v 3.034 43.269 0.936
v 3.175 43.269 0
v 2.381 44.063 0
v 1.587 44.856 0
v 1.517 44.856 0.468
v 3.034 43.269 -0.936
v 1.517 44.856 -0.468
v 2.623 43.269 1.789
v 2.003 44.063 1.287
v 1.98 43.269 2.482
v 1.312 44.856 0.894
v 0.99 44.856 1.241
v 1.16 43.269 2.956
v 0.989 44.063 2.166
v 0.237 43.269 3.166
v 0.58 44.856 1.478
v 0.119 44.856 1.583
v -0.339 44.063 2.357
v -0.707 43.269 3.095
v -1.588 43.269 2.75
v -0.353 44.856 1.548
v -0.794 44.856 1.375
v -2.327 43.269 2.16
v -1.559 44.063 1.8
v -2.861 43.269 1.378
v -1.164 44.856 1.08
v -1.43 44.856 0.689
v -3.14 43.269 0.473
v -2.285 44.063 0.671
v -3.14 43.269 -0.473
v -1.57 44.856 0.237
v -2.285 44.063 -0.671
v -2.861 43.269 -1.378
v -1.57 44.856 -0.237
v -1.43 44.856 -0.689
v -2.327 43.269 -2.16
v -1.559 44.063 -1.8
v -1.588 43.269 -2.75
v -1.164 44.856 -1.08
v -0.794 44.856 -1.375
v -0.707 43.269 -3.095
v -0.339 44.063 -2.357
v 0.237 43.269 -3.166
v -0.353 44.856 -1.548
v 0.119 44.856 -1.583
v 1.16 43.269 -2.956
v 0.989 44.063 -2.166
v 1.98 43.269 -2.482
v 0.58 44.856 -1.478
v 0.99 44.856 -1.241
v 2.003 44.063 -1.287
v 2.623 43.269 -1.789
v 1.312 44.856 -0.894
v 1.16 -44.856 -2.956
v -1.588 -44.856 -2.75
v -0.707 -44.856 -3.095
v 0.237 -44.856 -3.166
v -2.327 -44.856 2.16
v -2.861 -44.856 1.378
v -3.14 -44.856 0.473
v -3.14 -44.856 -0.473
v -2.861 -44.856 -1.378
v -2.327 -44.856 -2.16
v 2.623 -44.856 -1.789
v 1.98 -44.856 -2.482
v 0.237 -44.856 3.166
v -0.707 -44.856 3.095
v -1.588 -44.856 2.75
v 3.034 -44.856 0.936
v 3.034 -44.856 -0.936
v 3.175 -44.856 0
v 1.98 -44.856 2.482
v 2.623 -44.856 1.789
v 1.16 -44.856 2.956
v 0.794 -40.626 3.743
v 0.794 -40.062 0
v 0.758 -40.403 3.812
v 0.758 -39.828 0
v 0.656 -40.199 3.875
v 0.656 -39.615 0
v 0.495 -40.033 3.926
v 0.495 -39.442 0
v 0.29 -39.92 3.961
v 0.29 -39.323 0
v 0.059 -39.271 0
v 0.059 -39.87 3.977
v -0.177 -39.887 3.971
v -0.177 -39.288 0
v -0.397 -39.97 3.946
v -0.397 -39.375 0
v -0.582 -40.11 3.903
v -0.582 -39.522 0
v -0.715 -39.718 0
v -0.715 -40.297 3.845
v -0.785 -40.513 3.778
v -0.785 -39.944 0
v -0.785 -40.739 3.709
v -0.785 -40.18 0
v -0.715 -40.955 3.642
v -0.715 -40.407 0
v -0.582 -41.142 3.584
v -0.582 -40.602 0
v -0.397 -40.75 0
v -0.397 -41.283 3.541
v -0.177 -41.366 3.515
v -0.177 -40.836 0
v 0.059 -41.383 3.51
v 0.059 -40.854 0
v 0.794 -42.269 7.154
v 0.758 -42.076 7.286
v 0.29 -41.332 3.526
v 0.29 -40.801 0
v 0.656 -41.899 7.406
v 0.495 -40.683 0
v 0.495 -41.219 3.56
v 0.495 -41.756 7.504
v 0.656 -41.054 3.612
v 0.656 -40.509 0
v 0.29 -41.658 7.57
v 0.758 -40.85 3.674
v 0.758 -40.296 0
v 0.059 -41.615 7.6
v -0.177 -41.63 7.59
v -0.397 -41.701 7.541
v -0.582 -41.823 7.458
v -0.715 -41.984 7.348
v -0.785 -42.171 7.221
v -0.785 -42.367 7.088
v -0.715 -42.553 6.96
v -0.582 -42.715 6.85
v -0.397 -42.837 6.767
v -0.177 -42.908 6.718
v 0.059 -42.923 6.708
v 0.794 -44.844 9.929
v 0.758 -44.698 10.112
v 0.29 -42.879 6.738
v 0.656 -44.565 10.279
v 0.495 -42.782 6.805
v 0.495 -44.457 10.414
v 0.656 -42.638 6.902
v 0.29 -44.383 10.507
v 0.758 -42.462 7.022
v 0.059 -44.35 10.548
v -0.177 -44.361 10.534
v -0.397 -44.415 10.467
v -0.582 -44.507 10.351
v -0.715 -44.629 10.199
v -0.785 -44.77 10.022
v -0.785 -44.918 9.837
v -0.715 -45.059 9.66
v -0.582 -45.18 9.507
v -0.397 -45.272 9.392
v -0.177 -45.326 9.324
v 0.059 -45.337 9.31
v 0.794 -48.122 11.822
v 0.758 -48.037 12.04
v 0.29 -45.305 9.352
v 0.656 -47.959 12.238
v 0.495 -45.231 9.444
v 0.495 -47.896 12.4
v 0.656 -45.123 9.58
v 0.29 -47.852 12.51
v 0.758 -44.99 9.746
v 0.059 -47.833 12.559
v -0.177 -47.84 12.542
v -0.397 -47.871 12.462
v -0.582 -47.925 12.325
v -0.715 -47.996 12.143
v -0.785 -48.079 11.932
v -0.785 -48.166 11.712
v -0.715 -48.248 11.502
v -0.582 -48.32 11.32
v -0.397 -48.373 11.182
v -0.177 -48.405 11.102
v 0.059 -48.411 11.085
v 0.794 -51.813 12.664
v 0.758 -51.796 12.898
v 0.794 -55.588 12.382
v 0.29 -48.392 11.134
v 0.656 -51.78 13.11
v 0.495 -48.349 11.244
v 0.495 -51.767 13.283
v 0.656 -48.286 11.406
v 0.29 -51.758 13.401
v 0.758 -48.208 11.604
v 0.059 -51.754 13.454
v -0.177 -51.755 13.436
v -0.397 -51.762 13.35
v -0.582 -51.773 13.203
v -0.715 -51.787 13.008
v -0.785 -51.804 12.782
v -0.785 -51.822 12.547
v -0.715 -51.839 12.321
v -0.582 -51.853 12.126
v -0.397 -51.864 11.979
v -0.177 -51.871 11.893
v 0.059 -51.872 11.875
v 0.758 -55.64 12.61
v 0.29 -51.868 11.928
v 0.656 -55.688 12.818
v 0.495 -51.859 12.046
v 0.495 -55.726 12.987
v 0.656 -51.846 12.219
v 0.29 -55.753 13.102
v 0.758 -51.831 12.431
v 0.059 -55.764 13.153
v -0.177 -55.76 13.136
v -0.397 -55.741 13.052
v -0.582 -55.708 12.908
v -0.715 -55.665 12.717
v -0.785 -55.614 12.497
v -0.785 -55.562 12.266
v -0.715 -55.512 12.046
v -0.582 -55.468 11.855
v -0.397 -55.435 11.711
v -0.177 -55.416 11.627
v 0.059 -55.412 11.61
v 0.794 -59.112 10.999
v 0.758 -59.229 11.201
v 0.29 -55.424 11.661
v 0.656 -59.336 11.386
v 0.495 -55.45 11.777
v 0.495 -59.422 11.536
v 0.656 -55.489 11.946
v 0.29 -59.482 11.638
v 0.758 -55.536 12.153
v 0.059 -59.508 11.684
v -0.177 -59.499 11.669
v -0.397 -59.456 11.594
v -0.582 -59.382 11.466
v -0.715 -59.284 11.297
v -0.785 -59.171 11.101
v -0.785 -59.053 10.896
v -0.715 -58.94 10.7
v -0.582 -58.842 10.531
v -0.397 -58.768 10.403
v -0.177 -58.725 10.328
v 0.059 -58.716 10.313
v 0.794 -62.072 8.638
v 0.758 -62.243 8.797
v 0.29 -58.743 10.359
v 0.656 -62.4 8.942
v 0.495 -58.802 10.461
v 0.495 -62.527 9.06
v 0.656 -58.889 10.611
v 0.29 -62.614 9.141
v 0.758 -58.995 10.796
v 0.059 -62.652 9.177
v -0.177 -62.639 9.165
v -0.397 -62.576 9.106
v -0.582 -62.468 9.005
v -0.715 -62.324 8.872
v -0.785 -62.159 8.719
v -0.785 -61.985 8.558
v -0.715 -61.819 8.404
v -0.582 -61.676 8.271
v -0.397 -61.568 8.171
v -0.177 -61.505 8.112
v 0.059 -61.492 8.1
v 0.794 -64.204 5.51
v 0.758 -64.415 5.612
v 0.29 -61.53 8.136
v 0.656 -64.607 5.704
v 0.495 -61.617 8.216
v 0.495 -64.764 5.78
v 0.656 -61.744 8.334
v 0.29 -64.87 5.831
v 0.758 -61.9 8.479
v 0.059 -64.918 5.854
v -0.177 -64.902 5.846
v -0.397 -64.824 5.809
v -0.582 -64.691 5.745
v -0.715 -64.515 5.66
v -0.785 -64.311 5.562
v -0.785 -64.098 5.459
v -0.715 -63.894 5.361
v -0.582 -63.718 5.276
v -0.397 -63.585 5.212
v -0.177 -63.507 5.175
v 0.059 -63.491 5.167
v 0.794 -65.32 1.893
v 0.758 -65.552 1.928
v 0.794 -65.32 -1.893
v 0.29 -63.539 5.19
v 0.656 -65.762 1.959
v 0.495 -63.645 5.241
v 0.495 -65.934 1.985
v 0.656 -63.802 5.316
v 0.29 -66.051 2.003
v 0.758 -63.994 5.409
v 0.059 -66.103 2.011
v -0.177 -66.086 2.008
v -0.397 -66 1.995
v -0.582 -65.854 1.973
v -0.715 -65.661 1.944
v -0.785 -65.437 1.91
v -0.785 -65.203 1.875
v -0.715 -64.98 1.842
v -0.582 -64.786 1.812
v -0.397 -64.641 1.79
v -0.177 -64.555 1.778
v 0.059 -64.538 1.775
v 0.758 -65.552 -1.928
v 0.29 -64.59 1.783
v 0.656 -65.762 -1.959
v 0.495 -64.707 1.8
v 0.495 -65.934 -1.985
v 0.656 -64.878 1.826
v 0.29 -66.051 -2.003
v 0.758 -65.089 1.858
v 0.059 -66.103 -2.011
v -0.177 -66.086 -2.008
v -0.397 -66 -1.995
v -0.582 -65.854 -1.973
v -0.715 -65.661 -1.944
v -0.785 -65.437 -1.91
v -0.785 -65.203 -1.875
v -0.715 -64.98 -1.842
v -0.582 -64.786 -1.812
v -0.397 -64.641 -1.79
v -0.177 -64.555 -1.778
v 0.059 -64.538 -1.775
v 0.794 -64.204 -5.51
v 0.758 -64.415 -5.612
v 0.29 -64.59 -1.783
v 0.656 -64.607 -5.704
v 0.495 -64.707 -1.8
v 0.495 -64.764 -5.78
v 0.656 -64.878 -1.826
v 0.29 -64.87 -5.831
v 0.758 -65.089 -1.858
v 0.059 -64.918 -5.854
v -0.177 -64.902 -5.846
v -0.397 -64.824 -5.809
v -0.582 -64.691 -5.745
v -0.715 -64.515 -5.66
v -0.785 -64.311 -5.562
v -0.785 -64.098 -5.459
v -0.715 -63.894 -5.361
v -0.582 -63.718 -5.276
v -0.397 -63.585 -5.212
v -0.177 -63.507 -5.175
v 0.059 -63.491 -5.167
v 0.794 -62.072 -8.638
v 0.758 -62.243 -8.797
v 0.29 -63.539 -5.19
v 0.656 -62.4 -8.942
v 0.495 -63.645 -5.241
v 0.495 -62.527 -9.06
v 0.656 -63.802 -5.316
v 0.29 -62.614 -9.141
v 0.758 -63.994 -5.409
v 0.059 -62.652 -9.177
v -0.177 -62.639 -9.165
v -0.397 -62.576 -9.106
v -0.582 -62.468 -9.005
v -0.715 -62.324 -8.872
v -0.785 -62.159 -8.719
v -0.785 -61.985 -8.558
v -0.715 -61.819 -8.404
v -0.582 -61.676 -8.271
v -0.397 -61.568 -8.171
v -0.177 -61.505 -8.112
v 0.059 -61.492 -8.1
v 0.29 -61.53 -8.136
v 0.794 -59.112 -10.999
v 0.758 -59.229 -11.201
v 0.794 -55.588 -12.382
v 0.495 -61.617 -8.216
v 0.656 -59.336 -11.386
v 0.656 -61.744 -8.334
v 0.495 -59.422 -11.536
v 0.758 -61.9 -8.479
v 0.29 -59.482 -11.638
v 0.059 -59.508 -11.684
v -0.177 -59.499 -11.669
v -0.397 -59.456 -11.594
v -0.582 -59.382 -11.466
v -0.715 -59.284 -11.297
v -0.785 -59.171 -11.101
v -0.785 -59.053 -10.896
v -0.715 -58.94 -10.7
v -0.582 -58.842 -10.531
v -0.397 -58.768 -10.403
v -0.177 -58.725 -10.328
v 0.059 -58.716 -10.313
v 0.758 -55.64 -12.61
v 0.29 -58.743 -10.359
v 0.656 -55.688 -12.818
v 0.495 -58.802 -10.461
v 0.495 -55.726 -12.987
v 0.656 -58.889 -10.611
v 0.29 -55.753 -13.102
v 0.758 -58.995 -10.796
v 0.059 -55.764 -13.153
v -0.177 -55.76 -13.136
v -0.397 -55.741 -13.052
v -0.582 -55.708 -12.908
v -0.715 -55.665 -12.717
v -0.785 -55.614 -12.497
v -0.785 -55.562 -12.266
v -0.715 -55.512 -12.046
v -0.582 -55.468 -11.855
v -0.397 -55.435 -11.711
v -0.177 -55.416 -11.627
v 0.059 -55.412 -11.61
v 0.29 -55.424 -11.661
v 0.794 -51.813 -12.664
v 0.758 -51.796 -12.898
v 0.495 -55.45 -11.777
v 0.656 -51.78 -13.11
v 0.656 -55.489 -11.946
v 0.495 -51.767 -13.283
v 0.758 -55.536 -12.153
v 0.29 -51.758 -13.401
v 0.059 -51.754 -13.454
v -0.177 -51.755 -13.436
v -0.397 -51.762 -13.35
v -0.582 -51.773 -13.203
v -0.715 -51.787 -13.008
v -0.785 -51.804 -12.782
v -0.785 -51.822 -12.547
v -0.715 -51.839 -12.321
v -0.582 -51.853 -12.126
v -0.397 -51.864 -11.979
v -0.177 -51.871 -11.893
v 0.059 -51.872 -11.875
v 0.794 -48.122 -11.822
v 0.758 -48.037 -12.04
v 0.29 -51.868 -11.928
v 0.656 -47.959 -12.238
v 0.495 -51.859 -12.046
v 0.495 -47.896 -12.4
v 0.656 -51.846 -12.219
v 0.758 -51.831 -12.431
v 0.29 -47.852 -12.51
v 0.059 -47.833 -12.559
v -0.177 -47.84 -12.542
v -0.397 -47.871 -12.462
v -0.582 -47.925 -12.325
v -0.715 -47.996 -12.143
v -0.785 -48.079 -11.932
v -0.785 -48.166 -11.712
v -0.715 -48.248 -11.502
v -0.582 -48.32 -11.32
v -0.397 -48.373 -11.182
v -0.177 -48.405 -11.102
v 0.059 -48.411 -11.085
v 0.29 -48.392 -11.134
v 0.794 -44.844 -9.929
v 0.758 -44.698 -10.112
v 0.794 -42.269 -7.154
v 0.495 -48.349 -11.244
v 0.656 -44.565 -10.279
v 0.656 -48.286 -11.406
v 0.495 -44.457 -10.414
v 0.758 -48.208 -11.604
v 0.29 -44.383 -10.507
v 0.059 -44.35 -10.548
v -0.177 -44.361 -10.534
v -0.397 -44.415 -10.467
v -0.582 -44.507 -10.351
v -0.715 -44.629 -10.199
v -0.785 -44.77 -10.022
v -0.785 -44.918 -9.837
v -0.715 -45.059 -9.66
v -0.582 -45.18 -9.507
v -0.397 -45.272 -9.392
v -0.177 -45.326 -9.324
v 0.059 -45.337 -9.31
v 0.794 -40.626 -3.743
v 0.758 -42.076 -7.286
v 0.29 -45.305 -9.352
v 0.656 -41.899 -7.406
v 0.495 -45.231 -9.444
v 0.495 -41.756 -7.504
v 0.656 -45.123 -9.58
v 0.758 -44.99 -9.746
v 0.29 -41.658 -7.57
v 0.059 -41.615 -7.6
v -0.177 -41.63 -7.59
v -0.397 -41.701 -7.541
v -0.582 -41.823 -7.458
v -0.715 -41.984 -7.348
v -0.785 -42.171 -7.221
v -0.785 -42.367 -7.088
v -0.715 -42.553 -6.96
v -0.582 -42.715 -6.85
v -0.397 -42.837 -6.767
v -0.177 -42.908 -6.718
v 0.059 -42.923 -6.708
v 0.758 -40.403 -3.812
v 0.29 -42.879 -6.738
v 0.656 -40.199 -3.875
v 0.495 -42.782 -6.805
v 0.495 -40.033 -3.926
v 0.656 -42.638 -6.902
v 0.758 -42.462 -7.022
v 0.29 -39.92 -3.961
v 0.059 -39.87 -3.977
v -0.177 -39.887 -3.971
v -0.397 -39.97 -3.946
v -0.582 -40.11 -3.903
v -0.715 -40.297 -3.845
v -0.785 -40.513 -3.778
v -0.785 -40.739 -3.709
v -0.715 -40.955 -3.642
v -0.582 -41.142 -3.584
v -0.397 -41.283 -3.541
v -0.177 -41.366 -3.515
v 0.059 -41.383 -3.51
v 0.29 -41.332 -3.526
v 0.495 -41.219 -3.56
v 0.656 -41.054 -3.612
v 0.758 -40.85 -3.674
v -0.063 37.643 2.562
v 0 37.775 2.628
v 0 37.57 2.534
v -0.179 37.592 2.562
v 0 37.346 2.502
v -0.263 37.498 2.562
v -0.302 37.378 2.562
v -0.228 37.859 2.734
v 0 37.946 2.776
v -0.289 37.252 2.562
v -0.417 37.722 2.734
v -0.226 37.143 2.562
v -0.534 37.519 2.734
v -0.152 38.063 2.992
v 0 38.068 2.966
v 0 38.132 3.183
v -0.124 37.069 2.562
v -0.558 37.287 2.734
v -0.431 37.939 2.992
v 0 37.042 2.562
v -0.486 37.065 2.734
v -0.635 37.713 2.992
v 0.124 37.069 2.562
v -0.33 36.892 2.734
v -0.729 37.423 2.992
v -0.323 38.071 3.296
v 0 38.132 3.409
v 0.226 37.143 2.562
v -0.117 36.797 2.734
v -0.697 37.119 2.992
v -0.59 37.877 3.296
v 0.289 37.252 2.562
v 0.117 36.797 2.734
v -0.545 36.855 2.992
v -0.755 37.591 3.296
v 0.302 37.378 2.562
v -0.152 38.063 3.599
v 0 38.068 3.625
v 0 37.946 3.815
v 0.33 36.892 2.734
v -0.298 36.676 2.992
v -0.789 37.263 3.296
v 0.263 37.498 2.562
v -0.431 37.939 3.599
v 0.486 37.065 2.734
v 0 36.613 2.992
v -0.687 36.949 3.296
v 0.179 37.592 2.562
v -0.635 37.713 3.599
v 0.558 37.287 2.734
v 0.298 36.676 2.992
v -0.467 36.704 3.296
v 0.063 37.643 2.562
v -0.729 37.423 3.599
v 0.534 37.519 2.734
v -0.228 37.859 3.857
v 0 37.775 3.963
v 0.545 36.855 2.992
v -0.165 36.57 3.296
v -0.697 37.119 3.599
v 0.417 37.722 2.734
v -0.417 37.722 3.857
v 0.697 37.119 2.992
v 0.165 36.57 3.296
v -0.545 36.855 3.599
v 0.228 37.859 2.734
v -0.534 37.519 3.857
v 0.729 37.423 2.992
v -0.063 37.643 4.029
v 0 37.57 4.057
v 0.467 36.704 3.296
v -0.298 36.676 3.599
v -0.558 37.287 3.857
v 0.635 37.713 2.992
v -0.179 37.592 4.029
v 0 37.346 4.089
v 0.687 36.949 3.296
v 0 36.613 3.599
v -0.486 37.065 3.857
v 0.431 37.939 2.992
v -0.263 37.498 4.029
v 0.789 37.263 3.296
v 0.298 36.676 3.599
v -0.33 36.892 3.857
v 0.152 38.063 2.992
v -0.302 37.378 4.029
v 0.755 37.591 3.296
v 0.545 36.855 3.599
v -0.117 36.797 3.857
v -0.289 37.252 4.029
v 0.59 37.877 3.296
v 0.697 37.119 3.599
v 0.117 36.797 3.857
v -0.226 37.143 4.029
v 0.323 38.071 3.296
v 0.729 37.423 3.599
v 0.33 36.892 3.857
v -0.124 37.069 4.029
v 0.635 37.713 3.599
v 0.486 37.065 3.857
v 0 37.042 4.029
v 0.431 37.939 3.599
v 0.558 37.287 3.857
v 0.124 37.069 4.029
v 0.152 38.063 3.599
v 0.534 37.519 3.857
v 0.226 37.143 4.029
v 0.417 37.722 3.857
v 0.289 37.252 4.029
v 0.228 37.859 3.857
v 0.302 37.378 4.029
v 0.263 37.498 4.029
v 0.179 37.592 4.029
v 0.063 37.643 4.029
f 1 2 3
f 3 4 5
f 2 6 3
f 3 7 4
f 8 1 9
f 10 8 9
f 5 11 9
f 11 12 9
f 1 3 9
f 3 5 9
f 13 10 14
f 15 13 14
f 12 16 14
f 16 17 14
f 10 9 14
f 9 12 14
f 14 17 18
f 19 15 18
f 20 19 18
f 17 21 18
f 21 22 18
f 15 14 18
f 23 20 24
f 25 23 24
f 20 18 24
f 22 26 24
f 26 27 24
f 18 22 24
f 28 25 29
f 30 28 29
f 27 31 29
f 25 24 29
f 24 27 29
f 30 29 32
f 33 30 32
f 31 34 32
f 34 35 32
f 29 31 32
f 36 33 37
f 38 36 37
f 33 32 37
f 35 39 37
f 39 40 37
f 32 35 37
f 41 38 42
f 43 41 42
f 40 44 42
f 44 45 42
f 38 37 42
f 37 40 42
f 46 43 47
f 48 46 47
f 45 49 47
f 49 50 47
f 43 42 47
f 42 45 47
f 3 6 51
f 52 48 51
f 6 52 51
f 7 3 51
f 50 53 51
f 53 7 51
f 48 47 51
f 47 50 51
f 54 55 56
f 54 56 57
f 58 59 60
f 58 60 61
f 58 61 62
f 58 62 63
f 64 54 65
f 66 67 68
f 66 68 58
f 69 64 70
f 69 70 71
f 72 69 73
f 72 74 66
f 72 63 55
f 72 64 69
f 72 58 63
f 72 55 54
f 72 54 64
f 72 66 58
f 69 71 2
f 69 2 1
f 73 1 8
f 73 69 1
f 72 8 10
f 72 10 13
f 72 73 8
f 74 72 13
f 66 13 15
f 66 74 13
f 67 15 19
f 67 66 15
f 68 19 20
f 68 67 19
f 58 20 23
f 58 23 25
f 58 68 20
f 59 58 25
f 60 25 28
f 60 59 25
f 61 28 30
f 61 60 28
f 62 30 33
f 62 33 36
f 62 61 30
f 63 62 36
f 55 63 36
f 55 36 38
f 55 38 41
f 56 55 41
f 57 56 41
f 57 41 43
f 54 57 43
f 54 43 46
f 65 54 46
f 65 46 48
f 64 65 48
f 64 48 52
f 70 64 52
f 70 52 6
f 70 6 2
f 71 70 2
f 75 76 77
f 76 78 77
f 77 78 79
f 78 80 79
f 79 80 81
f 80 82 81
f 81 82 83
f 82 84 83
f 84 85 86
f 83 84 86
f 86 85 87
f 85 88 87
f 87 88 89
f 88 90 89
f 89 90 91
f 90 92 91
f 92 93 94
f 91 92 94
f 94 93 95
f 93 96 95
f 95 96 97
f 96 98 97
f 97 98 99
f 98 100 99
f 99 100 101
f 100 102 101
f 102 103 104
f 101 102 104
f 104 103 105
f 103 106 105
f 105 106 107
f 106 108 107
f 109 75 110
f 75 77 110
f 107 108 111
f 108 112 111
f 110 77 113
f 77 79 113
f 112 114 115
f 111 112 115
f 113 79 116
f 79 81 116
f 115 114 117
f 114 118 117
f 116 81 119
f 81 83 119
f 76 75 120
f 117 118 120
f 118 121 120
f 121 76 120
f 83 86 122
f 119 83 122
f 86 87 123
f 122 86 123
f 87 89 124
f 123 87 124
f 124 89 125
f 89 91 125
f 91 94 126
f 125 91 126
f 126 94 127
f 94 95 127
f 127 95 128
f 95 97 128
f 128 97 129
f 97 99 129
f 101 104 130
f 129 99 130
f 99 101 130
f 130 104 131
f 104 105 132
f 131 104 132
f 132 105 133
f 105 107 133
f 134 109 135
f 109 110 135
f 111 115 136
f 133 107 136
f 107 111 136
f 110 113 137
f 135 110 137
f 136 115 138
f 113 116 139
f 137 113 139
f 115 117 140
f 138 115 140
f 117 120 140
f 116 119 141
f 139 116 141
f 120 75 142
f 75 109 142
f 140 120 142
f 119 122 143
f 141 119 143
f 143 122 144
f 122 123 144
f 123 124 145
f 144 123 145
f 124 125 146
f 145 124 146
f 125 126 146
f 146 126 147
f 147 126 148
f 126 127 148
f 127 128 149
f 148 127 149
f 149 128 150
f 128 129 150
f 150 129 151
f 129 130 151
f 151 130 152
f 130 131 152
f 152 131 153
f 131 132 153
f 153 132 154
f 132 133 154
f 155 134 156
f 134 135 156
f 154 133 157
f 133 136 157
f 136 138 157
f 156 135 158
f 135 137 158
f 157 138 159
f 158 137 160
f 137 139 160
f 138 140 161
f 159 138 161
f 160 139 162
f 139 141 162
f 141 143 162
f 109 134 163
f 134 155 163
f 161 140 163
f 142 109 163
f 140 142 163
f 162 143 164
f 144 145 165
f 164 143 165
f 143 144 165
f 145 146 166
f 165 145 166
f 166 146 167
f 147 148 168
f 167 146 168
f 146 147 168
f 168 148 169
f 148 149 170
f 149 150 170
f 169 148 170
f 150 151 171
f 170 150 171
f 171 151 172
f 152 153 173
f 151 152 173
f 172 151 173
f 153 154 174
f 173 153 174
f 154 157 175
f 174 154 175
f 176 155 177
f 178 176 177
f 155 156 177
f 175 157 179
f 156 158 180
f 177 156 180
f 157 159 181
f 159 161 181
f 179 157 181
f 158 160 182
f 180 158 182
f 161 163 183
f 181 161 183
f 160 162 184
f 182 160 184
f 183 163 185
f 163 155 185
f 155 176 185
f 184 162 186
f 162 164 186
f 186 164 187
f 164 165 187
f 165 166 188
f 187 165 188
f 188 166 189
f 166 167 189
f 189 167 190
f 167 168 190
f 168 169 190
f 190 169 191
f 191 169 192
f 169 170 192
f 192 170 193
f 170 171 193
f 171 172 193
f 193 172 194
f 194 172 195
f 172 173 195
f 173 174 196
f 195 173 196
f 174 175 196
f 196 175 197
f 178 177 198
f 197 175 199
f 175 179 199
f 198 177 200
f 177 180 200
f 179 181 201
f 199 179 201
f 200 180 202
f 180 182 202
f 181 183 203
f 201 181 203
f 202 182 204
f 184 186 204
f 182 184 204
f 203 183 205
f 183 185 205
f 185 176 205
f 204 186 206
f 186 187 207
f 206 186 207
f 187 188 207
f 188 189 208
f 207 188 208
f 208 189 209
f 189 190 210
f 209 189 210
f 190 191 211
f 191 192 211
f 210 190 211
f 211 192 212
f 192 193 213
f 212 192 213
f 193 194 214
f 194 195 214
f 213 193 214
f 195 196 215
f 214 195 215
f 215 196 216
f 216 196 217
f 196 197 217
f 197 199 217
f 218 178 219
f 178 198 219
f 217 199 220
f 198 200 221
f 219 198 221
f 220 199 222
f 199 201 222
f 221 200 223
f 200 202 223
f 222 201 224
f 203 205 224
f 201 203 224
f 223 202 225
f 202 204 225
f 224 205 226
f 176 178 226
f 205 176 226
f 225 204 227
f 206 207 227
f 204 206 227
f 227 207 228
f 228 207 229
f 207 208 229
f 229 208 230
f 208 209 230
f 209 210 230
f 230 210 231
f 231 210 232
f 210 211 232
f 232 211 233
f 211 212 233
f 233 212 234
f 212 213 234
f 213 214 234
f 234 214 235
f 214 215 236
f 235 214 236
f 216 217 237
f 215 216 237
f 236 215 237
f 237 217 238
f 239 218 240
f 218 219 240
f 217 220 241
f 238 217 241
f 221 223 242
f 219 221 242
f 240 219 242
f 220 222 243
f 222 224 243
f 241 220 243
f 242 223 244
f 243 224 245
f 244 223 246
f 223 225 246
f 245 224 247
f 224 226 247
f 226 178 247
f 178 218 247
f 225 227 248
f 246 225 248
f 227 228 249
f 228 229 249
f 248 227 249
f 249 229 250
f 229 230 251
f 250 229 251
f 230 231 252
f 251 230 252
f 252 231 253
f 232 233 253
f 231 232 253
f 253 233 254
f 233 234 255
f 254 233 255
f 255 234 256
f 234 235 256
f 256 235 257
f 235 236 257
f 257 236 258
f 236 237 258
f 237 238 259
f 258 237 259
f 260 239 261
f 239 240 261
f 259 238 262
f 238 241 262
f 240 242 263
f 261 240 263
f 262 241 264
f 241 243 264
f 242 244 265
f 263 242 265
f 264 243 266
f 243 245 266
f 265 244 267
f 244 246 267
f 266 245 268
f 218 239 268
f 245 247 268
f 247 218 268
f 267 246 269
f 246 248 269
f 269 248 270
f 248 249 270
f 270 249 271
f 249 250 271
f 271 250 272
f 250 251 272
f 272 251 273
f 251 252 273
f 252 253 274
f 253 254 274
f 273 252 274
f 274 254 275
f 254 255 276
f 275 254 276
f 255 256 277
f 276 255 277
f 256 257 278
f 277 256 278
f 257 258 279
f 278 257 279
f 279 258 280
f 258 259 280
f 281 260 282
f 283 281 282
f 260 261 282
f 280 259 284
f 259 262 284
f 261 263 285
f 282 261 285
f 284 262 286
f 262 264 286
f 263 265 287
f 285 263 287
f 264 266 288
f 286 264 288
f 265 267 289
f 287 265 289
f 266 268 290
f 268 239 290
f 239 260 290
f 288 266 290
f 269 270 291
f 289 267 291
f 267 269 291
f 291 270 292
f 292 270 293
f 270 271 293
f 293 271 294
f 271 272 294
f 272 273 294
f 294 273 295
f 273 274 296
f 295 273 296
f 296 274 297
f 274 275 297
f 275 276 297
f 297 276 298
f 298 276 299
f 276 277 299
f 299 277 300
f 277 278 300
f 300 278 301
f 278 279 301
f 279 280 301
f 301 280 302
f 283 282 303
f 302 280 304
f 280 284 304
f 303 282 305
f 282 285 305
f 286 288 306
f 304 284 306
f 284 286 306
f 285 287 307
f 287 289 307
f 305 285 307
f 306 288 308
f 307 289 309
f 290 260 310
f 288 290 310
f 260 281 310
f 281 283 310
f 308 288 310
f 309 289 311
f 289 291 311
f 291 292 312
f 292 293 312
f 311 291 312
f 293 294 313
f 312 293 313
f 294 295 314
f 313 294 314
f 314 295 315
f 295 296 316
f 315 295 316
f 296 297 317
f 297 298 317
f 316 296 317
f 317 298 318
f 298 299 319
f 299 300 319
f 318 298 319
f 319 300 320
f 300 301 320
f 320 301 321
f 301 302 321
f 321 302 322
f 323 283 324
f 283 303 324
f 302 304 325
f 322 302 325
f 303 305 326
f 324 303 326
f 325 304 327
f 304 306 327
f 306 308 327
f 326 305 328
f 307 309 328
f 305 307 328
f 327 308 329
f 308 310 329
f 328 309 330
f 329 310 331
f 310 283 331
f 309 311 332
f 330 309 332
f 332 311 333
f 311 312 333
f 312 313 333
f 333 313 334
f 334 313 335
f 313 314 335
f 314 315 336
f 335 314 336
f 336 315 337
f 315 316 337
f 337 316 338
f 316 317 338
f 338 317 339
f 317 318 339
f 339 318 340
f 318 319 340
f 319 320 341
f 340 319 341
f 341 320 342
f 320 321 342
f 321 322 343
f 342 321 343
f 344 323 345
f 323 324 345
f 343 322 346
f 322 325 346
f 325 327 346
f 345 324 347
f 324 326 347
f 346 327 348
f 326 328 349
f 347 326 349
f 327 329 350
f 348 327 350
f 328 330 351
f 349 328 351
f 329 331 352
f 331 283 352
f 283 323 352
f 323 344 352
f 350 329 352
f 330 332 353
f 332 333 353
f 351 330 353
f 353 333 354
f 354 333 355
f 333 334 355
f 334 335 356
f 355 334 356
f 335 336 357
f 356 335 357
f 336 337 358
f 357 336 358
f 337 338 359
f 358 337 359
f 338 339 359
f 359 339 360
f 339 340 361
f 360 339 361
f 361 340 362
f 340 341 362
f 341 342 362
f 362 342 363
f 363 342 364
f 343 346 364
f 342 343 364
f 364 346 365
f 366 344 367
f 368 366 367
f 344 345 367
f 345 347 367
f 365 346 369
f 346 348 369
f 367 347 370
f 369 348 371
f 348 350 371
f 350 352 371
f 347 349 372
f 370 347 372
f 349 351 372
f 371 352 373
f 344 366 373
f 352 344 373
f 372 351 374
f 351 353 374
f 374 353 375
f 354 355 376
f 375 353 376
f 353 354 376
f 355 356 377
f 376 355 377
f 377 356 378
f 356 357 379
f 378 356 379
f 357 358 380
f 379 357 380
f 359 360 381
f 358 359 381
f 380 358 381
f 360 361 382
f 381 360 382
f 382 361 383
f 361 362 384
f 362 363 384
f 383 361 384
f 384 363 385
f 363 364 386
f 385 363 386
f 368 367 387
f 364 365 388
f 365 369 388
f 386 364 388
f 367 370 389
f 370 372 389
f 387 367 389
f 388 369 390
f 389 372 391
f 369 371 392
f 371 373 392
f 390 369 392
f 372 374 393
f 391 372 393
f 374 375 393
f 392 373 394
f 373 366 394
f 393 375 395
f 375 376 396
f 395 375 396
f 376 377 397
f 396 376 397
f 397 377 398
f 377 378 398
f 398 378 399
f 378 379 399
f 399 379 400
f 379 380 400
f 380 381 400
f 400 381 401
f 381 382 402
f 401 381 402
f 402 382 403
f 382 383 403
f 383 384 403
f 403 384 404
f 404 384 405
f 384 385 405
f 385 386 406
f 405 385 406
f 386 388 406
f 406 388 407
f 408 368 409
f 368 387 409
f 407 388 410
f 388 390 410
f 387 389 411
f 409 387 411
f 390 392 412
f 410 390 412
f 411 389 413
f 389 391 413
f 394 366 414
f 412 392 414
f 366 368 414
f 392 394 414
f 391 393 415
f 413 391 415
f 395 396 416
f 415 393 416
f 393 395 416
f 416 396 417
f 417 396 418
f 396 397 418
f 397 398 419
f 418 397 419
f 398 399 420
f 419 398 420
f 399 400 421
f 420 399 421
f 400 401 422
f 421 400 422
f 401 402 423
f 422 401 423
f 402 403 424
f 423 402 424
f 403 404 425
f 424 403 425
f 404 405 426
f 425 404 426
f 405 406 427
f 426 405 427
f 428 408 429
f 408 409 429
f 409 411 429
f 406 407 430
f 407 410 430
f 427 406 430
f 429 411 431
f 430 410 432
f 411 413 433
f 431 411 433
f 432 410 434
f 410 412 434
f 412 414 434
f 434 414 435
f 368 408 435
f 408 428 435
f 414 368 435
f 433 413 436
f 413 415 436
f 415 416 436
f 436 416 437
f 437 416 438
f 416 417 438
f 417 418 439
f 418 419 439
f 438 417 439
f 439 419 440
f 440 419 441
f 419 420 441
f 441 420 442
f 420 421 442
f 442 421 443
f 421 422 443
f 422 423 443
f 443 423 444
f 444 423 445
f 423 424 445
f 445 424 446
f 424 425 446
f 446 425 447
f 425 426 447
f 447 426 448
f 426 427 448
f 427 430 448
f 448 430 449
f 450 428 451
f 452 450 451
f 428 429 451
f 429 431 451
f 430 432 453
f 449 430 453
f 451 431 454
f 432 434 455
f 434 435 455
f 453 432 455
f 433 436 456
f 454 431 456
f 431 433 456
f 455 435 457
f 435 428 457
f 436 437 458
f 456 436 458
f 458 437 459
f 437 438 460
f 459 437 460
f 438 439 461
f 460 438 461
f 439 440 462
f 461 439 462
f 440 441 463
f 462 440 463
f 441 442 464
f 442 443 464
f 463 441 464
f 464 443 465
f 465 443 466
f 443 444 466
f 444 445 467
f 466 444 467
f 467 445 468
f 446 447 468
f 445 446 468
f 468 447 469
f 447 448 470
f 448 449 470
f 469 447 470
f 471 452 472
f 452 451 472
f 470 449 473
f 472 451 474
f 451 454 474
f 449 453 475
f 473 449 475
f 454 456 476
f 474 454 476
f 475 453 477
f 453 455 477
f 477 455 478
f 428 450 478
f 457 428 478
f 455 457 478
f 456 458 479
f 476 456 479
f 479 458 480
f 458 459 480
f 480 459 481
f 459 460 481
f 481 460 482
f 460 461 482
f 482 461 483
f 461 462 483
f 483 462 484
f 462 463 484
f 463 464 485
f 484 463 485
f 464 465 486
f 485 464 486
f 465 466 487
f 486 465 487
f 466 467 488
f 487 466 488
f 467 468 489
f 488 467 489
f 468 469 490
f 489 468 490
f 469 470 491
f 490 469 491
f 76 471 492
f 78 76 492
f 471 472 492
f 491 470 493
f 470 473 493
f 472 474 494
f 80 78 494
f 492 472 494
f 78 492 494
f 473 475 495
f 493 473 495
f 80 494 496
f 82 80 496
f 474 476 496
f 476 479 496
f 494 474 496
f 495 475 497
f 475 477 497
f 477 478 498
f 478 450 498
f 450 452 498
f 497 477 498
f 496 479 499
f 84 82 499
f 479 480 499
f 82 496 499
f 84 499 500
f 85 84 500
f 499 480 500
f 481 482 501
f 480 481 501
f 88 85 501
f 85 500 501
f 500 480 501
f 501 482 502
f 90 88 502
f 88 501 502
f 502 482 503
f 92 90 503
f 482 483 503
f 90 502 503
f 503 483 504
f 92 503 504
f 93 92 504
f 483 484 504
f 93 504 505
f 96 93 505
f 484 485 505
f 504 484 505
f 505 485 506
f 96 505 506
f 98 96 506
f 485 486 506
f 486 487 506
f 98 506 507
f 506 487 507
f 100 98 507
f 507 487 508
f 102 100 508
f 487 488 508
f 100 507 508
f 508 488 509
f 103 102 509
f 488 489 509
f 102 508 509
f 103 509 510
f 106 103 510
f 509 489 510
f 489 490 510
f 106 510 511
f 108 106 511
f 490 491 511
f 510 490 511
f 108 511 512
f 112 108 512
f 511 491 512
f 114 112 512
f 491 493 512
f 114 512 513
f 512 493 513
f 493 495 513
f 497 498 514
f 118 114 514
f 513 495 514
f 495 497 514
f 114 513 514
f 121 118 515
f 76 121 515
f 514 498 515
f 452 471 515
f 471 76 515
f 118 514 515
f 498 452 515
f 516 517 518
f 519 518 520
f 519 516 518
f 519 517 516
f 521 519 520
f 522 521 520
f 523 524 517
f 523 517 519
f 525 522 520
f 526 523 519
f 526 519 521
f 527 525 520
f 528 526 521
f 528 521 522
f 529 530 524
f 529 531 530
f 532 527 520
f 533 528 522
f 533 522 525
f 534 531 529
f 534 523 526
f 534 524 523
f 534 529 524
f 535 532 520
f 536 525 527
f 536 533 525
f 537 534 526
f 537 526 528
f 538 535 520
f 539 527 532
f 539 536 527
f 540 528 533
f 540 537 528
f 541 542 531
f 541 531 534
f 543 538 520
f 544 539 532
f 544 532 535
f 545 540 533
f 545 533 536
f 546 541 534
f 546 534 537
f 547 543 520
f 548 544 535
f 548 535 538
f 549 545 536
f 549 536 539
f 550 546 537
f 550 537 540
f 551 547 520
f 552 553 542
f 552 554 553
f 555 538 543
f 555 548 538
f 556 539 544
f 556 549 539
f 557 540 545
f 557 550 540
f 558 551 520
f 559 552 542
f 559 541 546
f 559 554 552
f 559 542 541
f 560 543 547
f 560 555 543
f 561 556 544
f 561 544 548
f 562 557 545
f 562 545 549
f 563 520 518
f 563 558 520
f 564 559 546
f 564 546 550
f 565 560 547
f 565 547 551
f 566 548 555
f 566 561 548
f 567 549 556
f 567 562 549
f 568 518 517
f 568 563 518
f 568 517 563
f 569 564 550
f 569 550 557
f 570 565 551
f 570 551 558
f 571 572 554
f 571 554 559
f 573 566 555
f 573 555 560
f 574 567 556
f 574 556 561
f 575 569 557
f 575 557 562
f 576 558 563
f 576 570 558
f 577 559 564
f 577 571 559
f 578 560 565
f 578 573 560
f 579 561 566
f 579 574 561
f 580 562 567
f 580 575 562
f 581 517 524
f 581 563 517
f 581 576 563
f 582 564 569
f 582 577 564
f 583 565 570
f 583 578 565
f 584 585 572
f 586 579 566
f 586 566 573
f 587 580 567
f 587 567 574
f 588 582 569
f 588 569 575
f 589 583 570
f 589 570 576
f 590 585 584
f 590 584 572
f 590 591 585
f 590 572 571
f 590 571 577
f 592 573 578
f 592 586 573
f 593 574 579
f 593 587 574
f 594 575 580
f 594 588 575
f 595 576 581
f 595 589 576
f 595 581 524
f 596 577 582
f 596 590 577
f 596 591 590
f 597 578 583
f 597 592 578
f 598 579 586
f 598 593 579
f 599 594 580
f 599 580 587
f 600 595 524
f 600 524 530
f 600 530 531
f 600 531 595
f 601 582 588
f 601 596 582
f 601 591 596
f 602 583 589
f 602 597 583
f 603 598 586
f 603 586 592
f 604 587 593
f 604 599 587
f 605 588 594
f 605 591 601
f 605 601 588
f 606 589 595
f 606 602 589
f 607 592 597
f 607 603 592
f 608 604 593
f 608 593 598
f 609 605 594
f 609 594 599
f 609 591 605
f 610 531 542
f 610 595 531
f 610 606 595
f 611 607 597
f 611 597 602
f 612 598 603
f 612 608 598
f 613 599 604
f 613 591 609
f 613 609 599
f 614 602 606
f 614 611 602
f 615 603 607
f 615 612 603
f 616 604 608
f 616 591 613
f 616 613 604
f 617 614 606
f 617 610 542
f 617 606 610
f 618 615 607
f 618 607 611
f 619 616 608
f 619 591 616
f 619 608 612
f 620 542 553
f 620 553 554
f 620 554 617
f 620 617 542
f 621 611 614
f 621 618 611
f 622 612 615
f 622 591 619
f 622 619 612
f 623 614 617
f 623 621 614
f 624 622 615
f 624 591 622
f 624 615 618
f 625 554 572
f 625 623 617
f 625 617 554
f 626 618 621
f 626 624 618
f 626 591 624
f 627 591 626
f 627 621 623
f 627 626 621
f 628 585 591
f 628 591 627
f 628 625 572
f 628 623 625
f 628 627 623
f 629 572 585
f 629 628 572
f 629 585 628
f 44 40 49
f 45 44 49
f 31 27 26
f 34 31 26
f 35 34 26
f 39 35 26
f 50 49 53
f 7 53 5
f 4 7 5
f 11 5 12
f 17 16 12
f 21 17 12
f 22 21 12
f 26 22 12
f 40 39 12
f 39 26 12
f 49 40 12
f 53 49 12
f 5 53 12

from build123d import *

# Parameters (mm, degrees)
F0_R     = 3.175
F1_DEPTH = 44.8564
F2_SIZE  = 1.5875
F5_R     = 0.79375


with BuildPart() as f1:
    # F0 (on Front) → F1 (new body, symmetric)
    with BuildSketch(Plane.XZ):
        Circle(F0_R)
    extrude(amount=F1_DEPTH, both=True)

    # F2
    f2_edges = [f1.edges().sort_by_distance(p)[0] for p in [
        (-3.175, 44.8564, 0),
    ]]
    chamfer(f2_edges, length=F2_SIZE)


with BuildPart() as f4:
    # F3 (on Right) → F4 (revolve)
    with BuildSketch(Plane.YZ):
        with BuildLine():
            Line((37.345998, 4.0894), (37.345998, 2.5019))
            ThreePointArc((37.345998, 2.5019), (38.139748, 3.29565), (37.345998, 4.0894))
        make_face()
    revolve(axis=Axis((0, 37.345998, 5.348319), (0, 0, 1)))


with BuildPart() as f6:
    # F5 (on Top) → F6 (revolve)
    with BuildSketch(Plane.XY):
        with Locations((0, -40.06215)):
            Circle(F5_R)
    revolve(axis=Axis((5.505938, -52.76215, 0), (1, 0, 0)))


solid = Compound([f1.part, f4.part, f6.part])
